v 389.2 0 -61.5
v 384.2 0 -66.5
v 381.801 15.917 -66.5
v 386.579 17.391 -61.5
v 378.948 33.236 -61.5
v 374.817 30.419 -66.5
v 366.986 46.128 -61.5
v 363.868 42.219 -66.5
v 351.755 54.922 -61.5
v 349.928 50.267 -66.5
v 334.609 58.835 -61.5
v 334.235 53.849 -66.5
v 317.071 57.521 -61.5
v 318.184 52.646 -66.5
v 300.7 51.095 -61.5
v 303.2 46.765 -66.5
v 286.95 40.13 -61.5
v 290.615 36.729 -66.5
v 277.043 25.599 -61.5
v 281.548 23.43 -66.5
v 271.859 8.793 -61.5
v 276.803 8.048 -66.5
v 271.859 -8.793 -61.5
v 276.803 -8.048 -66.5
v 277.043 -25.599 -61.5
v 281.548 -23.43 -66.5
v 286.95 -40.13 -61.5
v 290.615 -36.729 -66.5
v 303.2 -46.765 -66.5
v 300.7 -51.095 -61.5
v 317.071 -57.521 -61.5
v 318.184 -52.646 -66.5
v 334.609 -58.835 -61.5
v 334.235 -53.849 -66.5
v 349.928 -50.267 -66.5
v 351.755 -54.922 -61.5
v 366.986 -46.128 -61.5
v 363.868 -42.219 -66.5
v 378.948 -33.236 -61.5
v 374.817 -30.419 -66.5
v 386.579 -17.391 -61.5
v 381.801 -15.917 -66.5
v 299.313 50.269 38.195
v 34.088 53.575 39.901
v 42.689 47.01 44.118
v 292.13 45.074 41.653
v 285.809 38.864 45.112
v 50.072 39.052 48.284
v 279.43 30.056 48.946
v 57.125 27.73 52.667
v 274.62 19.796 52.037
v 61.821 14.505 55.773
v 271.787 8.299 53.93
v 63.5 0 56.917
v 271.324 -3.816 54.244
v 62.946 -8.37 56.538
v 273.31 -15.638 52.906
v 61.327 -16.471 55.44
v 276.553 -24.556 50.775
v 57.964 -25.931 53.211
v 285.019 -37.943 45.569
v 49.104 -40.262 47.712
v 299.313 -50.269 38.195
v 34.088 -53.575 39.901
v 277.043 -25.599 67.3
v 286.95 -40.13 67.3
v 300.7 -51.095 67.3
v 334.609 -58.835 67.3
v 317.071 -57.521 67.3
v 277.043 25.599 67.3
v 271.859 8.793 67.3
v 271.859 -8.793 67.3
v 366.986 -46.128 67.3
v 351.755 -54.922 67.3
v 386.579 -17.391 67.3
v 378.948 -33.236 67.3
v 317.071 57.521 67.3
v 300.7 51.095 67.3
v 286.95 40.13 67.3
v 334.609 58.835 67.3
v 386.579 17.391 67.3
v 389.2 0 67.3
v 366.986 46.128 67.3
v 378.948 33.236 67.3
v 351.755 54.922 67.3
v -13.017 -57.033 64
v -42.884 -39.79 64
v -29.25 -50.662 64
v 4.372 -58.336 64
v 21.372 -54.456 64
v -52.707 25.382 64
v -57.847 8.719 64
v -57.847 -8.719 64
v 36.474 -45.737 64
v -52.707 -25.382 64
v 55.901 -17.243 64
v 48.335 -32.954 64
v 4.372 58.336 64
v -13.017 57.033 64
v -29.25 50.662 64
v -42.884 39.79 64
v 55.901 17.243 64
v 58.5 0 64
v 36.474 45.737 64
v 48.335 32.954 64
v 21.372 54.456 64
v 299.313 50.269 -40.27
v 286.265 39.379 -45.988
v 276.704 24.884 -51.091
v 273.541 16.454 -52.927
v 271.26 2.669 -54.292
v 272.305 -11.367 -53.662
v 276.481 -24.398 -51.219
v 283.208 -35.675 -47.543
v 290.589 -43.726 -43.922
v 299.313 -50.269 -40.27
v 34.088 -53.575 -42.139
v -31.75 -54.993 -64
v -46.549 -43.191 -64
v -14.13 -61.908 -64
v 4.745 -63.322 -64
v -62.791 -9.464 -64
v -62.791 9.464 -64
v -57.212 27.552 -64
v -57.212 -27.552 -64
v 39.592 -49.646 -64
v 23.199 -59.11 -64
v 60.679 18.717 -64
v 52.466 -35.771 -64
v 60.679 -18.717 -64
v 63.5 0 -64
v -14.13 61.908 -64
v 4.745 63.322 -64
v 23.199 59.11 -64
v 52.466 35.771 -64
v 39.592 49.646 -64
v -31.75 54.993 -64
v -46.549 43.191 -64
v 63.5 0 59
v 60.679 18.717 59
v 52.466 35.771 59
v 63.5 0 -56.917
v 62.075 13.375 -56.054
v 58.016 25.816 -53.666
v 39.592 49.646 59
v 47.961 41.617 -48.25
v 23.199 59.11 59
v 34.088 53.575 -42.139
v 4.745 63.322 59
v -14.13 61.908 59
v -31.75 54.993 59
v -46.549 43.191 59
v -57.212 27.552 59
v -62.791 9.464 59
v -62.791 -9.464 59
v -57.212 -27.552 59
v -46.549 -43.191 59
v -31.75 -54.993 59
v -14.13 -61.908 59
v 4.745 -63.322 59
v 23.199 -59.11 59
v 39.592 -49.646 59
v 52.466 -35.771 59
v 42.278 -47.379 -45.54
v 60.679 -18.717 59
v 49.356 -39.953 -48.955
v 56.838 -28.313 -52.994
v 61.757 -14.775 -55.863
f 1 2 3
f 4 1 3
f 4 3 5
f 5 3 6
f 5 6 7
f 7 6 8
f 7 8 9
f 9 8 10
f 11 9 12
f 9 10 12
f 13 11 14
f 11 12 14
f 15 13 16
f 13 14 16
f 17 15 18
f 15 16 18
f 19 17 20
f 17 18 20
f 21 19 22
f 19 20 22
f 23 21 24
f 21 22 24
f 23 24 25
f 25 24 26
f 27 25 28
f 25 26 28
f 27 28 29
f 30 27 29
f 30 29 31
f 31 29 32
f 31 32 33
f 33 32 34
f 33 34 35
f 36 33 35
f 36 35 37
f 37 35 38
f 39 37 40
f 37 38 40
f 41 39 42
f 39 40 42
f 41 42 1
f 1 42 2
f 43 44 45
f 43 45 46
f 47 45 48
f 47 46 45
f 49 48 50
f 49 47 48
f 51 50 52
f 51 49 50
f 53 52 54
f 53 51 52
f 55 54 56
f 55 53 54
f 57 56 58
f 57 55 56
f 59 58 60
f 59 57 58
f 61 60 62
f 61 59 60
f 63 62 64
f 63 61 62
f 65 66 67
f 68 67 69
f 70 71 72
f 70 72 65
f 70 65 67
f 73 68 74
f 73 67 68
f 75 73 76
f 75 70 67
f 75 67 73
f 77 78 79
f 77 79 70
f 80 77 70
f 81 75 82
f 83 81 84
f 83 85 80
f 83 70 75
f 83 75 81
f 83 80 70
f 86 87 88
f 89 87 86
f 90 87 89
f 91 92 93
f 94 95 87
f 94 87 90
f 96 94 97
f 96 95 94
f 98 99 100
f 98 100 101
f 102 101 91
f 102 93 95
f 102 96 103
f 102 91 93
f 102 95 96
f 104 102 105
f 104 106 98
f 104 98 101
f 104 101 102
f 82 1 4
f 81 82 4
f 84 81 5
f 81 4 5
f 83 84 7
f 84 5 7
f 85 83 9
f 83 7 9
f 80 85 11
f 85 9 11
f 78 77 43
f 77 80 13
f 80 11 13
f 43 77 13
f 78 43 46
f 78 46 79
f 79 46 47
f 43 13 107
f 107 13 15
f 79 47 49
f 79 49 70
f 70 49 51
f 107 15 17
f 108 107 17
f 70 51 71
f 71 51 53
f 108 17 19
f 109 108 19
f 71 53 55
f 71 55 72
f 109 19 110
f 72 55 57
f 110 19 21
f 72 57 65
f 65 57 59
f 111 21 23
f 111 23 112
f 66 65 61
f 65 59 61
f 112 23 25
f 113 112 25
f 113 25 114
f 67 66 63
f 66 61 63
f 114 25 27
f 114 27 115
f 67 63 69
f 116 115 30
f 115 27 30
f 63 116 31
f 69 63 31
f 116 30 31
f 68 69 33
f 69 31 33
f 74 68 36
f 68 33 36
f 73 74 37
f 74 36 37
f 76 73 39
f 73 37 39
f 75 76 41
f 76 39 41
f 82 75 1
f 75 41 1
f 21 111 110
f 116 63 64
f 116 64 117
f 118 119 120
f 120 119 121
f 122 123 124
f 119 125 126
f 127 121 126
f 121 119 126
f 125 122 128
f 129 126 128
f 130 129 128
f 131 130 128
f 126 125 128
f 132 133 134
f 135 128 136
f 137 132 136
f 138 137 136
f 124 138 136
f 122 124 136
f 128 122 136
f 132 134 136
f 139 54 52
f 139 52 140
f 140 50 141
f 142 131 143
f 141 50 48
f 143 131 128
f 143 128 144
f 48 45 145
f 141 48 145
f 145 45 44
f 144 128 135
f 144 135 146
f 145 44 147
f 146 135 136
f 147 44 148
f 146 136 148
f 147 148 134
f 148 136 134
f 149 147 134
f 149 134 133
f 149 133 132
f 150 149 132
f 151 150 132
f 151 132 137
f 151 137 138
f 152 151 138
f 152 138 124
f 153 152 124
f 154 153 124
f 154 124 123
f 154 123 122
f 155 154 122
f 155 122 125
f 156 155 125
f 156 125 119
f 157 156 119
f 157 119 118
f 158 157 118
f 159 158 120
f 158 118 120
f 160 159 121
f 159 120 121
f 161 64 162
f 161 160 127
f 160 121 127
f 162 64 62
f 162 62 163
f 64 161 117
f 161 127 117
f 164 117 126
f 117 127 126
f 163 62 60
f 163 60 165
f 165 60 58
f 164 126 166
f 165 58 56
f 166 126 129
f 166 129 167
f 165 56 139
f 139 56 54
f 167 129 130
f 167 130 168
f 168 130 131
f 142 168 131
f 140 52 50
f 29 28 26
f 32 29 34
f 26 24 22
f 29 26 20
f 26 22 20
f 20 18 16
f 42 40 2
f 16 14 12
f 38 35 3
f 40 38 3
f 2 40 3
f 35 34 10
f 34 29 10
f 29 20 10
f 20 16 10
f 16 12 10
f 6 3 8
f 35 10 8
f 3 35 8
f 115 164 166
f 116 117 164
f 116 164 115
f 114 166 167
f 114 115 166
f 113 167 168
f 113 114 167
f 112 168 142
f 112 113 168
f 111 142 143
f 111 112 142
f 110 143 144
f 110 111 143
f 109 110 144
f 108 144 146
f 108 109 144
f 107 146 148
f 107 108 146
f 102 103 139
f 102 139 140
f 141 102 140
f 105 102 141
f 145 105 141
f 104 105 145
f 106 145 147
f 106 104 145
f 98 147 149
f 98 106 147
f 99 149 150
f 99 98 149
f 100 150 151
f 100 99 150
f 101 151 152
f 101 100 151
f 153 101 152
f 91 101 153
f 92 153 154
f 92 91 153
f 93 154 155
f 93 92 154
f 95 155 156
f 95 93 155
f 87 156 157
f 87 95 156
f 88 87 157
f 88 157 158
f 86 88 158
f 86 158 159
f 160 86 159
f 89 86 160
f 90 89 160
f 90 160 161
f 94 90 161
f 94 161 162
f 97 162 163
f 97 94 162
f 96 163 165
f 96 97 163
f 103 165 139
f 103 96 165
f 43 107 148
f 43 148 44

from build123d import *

# Parameters (mm, degrees)
BOSS_EXTRUDE1_DEPTH      = 64
BOSS_EXTRUDE1_DEPTH_BACK = 64
SKETCH1_R                = 63.5
CHAMFER1_SIZE            = 5
BOSS_EXTRUDE2_DEPTH      = 67.3
BOSS_EXTRUDE2_DEPTH_BACK = 66.5
SKETCH9_R                = 59
CHAMFER2_SIZE            = 5


with BuildPart() as part:
    # Sketch1 → Boss-Extrude1 (new, two sides: drawn at the far end of the back side and taken through both)
    with BuildSketch(Plane.XY.offset(-BOSS_EXTRUDE1_DEPTH_BACK)):
        Circle(SKETCH1_R)
    extrude(amount=BOSS_EXTRUDE1_DEPTH + BOSS_EXTRUDE1_DEPTH_BACK)

    # Chamfer1
    chamfer1_edges = [part.edges().sort_by_distance(p)[0] for p in [
        (-63.5, 0, 64),
    ]]
    chamfer(chamfer1_edges, length=CHAMFER1_SIZE)

    # Sketch6 for Loft1 → Loft1 section 0
    with BuildSketch(Plane.ZY):
        with BuildLine():
            Line((40.120383673, -54), (-42.379616327, -54))
            # circular arc as an exact rational Bezier (weights 1, cos(half-angle), 1)
            Bezier((-42.379616327, -54), (-75.725192624, 0), (-42.379616327, 54), weights=[1, 0.850849875, 1])
            Line((-42.379616327, 54), (40.120383673, 54))
            Bezier((40.120383673, 54), (79.472033784, 0), (40.120383673, -54), weights=[1, 0.80817386, 1])
        make_face()
    # Sketch7 for Loft1 → Loft1 section 1
    with BuildSketch(Plane(origin=(330.2, 0, 59), x_dir=(0, 0, 1), z_dir=(-1, 0, 0))):
        with BuildLine():
            Line((-21.003548385, -49.884), (-99.052818608, -49.884))
            Bezier((-99.052818608, -49.884), (-128.286627078, 0), (-99.052818608, 49.884), weights=[1, 0.862762376, 1])
            Line((-99.052818608, 49.884), (-21.003548385, 49.884))
            Bezier((-21.003548385, 49.884), (13.568719727, 0), (-21.003548385, -49.884), weights=[1, 0.821905309, 1])
        make_face()
    loft()

    # Sketch9 → Boss-Extrude2 (add, two sides: drawn at the far end of the back side and taken through both)
    with BuildSketch(Plane.XY.offset(-BOSS_EXTRUDE2_DEPTH_BACK)):
        with Locations((330.2, 0)):
            Circle(SKETCH9_R)
    extrude(amount=BOSS_EXTRUDE2_DEPTH + BOSS_EXTRUDE2_DEPTH_BACK)

    # Chamfer2
    chamfer2_edges = [part.edges().sort_by_distance(p)[0] for p in [
        (271.2, 0, -66.5),
    ]]
    chamfer(chamfer2_edges, length=CHAMFER2_SIZE)


solid = part.part
